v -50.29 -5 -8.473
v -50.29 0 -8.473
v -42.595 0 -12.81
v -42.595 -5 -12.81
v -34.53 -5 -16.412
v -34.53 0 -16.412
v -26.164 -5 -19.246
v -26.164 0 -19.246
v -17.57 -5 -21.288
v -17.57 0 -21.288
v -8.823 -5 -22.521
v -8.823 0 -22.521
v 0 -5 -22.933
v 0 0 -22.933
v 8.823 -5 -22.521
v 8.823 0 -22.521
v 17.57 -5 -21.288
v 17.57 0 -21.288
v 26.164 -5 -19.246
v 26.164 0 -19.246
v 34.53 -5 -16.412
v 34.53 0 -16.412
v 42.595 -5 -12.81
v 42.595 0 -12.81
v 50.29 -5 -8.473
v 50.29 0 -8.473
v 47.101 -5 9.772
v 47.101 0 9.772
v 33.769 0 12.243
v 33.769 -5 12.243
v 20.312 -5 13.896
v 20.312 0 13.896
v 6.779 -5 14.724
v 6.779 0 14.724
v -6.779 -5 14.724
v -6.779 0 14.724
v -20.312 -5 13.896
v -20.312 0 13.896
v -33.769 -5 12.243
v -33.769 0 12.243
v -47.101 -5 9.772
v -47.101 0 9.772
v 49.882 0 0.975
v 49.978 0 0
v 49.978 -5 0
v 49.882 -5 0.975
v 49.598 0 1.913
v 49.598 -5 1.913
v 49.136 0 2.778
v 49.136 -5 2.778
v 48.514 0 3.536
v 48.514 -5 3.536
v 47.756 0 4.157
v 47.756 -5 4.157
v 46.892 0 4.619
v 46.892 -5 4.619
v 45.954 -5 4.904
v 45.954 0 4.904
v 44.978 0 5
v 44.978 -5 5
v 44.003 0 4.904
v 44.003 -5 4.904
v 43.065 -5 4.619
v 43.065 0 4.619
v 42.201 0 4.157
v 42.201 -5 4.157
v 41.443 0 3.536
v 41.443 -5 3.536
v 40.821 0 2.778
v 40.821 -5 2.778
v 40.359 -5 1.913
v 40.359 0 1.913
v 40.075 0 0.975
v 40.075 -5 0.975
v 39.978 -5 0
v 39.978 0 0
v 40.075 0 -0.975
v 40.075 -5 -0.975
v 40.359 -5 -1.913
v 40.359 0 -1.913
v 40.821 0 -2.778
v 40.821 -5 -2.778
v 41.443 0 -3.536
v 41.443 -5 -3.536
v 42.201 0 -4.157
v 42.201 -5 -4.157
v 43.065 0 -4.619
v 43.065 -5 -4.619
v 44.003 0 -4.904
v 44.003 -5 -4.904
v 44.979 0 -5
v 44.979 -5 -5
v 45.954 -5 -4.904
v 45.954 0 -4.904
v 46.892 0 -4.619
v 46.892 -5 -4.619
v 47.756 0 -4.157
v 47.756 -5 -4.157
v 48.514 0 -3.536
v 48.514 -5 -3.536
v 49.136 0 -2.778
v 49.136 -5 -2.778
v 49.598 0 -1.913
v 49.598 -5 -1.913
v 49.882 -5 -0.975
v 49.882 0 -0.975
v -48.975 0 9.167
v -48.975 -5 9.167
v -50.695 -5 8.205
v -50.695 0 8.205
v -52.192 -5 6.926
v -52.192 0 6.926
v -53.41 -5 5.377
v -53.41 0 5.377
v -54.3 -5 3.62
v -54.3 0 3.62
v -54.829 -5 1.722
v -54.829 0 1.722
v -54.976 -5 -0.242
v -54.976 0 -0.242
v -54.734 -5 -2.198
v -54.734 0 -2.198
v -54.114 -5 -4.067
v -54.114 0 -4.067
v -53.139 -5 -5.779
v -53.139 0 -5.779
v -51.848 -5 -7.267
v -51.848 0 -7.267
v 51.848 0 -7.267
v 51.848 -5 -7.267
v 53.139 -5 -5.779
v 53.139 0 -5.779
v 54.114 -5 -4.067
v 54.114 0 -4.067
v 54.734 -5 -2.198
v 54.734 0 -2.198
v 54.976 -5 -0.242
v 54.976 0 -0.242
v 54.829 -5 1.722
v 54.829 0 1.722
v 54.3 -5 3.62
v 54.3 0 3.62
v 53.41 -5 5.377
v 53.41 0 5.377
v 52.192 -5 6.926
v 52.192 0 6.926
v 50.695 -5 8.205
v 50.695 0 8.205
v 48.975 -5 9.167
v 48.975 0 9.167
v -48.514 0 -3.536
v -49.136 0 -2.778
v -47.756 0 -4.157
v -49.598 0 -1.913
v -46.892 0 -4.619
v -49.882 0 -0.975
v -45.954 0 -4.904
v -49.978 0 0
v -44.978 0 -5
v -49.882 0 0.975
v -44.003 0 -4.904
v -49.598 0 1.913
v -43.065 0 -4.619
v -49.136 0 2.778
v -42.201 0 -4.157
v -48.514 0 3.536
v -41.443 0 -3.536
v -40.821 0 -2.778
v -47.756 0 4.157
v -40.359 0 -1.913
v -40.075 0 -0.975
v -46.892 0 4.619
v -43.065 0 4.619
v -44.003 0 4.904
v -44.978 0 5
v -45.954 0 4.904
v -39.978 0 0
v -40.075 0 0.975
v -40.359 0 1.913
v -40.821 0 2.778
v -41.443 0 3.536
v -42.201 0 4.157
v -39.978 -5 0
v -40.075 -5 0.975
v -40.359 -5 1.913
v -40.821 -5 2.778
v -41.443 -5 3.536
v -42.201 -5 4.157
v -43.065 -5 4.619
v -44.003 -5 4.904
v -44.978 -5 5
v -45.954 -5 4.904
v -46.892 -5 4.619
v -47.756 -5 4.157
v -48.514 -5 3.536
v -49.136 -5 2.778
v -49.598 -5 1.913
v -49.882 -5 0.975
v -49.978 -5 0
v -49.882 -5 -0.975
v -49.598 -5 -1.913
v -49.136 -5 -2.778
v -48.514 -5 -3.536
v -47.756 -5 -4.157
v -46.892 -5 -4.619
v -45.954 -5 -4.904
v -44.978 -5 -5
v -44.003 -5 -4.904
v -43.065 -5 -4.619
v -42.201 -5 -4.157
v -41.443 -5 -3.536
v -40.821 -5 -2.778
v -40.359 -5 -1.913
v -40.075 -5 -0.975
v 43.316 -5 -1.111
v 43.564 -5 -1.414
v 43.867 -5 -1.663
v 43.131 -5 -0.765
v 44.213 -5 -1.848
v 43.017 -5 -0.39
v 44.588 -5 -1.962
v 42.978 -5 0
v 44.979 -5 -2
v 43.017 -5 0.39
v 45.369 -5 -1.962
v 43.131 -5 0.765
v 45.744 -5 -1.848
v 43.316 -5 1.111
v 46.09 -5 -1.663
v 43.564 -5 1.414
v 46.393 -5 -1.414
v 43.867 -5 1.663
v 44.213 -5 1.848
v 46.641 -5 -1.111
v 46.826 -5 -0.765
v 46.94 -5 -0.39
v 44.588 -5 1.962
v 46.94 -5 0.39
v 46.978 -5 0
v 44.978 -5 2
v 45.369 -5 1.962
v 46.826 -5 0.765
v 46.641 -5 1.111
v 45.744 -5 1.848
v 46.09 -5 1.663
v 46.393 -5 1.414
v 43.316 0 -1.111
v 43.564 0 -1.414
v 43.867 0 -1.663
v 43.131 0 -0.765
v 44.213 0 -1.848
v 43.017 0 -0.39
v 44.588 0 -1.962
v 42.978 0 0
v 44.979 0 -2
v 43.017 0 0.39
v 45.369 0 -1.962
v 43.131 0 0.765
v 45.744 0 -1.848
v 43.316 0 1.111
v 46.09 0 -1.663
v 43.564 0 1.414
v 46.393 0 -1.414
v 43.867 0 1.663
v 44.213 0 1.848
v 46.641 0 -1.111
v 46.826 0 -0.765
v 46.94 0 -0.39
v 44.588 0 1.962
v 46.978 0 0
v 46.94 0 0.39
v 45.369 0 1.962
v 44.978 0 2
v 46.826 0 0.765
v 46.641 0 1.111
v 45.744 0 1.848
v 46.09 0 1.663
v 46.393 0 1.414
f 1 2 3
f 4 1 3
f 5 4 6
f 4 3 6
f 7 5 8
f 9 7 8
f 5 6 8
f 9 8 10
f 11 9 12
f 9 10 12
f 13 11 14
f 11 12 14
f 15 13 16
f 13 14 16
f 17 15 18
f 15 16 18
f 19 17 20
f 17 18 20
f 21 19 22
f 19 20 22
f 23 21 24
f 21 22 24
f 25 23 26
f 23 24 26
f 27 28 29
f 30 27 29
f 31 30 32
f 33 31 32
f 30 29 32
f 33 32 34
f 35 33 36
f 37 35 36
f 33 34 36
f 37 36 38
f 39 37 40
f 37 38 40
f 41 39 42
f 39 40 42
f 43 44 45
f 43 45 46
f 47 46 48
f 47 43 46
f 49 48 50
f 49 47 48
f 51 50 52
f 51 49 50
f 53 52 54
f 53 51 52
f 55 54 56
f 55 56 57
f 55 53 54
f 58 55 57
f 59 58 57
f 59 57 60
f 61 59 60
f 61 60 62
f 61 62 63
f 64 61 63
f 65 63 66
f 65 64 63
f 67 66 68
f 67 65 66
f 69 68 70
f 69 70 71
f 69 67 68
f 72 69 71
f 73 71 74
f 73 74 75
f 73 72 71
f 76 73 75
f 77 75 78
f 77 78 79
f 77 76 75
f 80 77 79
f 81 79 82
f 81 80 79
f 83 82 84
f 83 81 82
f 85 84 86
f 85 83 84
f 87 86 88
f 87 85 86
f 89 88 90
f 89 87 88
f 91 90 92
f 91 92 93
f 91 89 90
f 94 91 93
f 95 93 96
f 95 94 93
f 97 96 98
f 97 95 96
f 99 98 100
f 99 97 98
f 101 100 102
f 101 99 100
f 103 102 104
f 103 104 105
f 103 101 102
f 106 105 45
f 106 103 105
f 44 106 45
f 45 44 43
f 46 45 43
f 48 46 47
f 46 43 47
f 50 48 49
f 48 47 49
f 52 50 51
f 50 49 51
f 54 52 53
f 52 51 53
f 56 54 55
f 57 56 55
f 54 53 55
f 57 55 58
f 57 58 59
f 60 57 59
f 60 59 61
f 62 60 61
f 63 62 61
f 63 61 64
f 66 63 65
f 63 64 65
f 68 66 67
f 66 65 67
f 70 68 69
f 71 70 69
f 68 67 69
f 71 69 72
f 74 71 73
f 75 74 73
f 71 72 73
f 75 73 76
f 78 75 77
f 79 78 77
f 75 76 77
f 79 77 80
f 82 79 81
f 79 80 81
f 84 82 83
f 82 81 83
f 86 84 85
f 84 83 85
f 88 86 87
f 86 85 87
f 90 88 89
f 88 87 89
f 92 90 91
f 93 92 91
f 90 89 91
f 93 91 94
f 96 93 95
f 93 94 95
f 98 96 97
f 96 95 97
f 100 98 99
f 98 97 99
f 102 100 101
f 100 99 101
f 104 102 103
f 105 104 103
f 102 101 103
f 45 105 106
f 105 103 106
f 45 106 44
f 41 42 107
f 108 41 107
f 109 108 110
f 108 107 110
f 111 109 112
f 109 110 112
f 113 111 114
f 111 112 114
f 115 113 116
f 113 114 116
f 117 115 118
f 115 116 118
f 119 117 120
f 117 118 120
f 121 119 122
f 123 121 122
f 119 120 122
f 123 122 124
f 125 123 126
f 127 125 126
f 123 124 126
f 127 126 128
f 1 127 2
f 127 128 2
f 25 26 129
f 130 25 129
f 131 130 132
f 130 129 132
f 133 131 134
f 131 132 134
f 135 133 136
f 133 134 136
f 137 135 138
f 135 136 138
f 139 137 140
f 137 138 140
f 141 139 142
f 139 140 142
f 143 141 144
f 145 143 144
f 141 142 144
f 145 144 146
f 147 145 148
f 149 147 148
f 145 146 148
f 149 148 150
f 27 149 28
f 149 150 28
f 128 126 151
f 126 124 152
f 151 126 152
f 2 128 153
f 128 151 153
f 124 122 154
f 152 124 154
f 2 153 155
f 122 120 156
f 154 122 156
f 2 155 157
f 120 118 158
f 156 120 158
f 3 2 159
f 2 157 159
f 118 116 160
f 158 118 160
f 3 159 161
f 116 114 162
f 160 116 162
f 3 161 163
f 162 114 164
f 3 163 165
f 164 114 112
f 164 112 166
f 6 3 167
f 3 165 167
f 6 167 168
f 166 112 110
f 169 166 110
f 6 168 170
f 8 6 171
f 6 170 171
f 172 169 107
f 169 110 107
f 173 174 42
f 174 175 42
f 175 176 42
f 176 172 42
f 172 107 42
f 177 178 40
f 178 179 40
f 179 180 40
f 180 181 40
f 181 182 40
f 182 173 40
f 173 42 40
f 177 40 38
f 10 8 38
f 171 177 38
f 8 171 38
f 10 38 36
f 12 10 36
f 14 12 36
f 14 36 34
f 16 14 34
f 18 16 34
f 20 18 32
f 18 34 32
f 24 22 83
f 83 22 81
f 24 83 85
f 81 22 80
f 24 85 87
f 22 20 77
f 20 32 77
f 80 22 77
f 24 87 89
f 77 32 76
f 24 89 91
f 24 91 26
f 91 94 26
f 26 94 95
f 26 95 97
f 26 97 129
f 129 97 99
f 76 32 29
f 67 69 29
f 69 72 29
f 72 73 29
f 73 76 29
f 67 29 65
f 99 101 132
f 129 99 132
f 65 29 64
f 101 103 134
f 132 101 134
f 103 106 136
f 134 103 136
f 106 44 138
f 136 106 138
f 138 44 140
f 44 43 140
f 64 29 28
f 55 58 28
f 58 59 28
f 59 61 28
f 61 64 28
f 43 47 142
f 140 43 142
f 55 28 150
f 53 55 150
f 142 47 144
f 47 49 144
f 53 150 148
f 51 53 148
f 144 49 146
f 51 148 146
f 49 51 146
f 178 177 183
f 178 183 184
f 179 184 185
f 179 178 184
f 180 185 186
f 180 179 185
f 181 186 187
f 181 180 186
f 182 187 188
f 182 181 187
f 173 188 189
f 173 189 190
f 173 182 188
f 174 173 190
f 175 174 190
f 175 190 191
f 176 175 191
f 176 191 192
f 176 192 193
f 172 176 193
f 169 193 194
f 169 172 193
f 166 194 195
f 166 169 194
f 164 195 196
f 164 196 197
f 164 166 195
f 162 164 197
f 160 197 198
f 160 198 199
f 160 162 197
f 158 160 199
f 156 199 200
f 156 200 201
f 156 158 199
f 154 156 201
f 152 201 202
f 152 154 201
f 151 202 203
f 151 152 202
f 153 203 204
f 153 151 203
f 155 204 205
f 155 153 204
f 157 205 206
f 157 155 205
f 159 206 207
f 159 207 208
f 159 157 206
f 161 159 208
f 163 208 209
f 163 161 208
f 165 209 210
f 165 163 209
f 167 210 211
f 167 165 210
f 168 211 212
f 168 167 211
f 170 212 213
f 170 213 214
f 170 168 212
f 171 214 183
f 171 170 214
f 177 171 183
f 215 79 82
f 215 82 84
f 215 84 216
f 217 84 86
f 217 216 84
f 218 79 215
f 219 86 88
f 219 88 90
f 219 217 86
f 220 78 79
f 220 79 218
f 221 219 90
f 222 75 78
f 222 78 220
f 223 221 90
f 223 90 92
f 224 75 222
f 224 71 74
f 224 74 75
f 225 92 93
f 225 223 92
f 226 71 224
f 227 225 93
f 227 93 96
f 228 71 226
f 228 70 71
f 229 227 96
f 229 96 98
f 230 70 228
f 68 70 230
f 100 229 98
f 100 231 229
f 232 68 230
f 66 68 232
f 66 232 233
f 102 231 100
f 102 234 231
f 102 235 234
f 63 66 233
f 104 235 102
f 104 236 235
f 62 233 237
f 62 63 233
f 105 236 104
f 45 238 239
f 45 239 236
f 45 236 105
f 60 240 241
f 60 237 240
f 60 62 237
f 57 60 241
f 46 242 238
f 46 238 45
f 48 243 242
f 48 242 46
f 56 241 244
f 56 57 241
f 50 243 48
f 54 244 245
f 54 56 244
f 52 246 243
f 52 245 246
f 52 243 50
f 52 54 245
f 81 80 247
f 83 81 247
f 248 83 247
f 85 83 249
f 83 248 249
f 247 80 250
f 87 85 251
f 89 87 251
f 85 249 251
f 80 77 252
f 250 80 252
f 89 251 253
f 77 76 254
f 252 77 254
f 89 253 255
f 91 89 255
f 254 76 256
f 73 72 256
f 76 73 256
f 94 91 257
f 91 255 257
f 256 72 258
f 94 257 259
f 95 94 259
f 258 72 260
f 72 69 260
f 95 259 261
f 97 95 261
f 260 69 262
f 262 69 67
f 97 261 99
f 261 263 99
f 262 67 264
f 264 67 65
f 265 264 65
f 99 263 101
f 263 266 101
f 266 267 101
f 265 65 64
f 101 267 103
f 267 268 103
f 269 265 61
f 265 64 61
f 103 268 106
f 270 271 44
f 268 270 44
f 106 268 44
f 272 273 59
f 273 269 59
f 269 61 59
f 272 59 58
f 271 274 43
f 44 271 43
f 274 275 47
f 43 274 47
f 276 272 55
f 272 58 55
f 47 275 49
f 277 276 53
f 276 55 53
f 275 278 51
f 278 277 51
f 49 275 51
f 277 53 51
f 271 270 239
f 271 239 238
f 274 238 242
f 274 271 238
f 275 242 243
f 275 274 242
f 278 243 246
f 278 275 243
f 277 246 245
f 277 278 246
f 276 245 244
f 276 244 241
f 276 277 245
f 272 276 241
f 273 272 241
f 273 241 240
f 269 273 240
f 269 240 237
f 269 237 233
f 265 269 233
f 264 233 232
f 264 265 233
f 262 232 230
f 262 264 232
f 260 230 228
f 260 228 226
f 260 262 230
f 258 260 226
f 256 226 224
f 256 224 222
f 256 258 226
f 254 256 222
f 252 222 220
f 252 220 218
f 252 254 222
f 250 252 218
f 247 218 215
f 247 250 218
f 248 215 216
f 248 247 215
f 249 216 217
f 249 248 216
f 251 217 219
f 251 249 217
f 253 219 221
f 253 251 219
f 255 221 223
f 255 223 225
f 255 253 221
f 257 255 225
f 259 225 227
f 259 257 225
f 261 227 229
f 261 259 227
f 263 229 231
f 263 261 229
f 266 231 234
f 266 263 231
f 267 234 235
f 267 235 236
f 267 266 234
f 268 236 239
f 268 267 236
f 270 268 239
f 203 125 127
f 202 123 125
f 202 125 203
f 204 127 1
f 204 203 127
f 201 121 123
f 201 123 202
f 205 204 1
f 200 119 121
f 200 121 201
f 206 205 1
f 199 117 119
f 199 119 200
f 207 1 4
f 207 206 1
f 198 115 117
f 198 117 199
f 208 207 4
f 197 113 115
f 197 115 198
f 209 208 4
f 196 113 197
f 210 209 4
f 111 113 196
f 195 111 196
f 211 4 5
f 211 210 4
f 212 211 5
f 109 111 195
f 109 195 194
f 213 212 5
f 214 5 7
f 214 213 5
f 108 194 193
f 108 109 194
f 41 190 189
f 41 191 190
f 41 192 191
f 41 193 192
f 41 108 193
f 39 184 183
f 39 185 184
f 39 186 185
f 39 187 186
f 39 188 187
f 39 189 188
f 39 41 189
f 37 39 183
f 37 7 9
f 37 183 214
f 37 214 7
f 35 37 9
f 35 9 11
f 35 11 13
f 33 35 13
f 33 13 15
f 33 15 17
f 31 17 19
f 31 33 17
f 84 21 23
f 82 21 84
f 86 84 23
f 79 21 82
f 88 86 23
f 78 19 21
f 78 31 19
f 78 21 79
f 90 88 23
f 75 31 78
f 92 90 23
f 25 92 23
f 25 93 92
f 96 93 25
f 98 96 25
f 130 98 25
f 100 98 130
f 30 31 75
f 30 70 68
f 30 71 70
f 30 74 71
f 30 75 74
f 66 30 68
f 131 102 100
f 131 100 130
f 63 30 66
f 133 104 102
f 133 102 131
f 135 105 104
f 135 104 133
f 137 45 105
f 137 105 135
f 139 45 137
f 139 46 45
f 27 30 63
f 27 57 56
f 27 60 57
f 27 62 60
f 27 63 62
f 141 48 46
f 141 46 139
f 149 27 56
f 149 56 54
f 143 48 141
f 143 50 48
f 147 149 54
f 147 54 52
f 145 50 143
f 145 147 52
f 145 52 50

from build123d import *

# Parameters (mm, degrees)
F0_R     = 5
F0_R_2   = 2
F1_DEPTH = 5
F2_DEPTH = 5


with BuildPart() as f1:
    # F0 (on Front) → F1 (new body)
    with BuildSketch(Plane.XZ):
        with Locations((44.9785, 0)):
            Circle(F0_R)
        with Locations((44.9785, 0)):
            Circle(F0_R_2, mode=Mode.SUBTRACT)
    extrude(amount=F1_DEPTH)


with BuildPart() as f2:
    # F0 (on Front) → F2 (new body)
    with BuildSketch(Plane.XZ):
        with BuildLine():
            ThreePointArc((-47.100518, 9.772259), (-54.829105, 1.722087), (-50.290112, -8.472708))
            ThreePointArc((-50.290112, -8.472708), (0, -22.933043), (50.290112, -8.472708))
            ThreePointArc((50.290112, -8.472708), (54.829105, 1.722087), (47.100518, 9.772259))
            ThreePointArc((47.100518, 9.772259), (0, 14.827227), (-47.100518, 9.772259))
        make_face()
        with Locations((-44.9785, 0)):
            Circle(F0_R, mode=Mode.SUBTRACT)
        with Locations((44.9785, 0)):
            Circle(F0_R, mode=Mode.SUBTRACT)
    extrude(amount=F2_DEPTH)


solid = Compound([f1.part, f2.part])
